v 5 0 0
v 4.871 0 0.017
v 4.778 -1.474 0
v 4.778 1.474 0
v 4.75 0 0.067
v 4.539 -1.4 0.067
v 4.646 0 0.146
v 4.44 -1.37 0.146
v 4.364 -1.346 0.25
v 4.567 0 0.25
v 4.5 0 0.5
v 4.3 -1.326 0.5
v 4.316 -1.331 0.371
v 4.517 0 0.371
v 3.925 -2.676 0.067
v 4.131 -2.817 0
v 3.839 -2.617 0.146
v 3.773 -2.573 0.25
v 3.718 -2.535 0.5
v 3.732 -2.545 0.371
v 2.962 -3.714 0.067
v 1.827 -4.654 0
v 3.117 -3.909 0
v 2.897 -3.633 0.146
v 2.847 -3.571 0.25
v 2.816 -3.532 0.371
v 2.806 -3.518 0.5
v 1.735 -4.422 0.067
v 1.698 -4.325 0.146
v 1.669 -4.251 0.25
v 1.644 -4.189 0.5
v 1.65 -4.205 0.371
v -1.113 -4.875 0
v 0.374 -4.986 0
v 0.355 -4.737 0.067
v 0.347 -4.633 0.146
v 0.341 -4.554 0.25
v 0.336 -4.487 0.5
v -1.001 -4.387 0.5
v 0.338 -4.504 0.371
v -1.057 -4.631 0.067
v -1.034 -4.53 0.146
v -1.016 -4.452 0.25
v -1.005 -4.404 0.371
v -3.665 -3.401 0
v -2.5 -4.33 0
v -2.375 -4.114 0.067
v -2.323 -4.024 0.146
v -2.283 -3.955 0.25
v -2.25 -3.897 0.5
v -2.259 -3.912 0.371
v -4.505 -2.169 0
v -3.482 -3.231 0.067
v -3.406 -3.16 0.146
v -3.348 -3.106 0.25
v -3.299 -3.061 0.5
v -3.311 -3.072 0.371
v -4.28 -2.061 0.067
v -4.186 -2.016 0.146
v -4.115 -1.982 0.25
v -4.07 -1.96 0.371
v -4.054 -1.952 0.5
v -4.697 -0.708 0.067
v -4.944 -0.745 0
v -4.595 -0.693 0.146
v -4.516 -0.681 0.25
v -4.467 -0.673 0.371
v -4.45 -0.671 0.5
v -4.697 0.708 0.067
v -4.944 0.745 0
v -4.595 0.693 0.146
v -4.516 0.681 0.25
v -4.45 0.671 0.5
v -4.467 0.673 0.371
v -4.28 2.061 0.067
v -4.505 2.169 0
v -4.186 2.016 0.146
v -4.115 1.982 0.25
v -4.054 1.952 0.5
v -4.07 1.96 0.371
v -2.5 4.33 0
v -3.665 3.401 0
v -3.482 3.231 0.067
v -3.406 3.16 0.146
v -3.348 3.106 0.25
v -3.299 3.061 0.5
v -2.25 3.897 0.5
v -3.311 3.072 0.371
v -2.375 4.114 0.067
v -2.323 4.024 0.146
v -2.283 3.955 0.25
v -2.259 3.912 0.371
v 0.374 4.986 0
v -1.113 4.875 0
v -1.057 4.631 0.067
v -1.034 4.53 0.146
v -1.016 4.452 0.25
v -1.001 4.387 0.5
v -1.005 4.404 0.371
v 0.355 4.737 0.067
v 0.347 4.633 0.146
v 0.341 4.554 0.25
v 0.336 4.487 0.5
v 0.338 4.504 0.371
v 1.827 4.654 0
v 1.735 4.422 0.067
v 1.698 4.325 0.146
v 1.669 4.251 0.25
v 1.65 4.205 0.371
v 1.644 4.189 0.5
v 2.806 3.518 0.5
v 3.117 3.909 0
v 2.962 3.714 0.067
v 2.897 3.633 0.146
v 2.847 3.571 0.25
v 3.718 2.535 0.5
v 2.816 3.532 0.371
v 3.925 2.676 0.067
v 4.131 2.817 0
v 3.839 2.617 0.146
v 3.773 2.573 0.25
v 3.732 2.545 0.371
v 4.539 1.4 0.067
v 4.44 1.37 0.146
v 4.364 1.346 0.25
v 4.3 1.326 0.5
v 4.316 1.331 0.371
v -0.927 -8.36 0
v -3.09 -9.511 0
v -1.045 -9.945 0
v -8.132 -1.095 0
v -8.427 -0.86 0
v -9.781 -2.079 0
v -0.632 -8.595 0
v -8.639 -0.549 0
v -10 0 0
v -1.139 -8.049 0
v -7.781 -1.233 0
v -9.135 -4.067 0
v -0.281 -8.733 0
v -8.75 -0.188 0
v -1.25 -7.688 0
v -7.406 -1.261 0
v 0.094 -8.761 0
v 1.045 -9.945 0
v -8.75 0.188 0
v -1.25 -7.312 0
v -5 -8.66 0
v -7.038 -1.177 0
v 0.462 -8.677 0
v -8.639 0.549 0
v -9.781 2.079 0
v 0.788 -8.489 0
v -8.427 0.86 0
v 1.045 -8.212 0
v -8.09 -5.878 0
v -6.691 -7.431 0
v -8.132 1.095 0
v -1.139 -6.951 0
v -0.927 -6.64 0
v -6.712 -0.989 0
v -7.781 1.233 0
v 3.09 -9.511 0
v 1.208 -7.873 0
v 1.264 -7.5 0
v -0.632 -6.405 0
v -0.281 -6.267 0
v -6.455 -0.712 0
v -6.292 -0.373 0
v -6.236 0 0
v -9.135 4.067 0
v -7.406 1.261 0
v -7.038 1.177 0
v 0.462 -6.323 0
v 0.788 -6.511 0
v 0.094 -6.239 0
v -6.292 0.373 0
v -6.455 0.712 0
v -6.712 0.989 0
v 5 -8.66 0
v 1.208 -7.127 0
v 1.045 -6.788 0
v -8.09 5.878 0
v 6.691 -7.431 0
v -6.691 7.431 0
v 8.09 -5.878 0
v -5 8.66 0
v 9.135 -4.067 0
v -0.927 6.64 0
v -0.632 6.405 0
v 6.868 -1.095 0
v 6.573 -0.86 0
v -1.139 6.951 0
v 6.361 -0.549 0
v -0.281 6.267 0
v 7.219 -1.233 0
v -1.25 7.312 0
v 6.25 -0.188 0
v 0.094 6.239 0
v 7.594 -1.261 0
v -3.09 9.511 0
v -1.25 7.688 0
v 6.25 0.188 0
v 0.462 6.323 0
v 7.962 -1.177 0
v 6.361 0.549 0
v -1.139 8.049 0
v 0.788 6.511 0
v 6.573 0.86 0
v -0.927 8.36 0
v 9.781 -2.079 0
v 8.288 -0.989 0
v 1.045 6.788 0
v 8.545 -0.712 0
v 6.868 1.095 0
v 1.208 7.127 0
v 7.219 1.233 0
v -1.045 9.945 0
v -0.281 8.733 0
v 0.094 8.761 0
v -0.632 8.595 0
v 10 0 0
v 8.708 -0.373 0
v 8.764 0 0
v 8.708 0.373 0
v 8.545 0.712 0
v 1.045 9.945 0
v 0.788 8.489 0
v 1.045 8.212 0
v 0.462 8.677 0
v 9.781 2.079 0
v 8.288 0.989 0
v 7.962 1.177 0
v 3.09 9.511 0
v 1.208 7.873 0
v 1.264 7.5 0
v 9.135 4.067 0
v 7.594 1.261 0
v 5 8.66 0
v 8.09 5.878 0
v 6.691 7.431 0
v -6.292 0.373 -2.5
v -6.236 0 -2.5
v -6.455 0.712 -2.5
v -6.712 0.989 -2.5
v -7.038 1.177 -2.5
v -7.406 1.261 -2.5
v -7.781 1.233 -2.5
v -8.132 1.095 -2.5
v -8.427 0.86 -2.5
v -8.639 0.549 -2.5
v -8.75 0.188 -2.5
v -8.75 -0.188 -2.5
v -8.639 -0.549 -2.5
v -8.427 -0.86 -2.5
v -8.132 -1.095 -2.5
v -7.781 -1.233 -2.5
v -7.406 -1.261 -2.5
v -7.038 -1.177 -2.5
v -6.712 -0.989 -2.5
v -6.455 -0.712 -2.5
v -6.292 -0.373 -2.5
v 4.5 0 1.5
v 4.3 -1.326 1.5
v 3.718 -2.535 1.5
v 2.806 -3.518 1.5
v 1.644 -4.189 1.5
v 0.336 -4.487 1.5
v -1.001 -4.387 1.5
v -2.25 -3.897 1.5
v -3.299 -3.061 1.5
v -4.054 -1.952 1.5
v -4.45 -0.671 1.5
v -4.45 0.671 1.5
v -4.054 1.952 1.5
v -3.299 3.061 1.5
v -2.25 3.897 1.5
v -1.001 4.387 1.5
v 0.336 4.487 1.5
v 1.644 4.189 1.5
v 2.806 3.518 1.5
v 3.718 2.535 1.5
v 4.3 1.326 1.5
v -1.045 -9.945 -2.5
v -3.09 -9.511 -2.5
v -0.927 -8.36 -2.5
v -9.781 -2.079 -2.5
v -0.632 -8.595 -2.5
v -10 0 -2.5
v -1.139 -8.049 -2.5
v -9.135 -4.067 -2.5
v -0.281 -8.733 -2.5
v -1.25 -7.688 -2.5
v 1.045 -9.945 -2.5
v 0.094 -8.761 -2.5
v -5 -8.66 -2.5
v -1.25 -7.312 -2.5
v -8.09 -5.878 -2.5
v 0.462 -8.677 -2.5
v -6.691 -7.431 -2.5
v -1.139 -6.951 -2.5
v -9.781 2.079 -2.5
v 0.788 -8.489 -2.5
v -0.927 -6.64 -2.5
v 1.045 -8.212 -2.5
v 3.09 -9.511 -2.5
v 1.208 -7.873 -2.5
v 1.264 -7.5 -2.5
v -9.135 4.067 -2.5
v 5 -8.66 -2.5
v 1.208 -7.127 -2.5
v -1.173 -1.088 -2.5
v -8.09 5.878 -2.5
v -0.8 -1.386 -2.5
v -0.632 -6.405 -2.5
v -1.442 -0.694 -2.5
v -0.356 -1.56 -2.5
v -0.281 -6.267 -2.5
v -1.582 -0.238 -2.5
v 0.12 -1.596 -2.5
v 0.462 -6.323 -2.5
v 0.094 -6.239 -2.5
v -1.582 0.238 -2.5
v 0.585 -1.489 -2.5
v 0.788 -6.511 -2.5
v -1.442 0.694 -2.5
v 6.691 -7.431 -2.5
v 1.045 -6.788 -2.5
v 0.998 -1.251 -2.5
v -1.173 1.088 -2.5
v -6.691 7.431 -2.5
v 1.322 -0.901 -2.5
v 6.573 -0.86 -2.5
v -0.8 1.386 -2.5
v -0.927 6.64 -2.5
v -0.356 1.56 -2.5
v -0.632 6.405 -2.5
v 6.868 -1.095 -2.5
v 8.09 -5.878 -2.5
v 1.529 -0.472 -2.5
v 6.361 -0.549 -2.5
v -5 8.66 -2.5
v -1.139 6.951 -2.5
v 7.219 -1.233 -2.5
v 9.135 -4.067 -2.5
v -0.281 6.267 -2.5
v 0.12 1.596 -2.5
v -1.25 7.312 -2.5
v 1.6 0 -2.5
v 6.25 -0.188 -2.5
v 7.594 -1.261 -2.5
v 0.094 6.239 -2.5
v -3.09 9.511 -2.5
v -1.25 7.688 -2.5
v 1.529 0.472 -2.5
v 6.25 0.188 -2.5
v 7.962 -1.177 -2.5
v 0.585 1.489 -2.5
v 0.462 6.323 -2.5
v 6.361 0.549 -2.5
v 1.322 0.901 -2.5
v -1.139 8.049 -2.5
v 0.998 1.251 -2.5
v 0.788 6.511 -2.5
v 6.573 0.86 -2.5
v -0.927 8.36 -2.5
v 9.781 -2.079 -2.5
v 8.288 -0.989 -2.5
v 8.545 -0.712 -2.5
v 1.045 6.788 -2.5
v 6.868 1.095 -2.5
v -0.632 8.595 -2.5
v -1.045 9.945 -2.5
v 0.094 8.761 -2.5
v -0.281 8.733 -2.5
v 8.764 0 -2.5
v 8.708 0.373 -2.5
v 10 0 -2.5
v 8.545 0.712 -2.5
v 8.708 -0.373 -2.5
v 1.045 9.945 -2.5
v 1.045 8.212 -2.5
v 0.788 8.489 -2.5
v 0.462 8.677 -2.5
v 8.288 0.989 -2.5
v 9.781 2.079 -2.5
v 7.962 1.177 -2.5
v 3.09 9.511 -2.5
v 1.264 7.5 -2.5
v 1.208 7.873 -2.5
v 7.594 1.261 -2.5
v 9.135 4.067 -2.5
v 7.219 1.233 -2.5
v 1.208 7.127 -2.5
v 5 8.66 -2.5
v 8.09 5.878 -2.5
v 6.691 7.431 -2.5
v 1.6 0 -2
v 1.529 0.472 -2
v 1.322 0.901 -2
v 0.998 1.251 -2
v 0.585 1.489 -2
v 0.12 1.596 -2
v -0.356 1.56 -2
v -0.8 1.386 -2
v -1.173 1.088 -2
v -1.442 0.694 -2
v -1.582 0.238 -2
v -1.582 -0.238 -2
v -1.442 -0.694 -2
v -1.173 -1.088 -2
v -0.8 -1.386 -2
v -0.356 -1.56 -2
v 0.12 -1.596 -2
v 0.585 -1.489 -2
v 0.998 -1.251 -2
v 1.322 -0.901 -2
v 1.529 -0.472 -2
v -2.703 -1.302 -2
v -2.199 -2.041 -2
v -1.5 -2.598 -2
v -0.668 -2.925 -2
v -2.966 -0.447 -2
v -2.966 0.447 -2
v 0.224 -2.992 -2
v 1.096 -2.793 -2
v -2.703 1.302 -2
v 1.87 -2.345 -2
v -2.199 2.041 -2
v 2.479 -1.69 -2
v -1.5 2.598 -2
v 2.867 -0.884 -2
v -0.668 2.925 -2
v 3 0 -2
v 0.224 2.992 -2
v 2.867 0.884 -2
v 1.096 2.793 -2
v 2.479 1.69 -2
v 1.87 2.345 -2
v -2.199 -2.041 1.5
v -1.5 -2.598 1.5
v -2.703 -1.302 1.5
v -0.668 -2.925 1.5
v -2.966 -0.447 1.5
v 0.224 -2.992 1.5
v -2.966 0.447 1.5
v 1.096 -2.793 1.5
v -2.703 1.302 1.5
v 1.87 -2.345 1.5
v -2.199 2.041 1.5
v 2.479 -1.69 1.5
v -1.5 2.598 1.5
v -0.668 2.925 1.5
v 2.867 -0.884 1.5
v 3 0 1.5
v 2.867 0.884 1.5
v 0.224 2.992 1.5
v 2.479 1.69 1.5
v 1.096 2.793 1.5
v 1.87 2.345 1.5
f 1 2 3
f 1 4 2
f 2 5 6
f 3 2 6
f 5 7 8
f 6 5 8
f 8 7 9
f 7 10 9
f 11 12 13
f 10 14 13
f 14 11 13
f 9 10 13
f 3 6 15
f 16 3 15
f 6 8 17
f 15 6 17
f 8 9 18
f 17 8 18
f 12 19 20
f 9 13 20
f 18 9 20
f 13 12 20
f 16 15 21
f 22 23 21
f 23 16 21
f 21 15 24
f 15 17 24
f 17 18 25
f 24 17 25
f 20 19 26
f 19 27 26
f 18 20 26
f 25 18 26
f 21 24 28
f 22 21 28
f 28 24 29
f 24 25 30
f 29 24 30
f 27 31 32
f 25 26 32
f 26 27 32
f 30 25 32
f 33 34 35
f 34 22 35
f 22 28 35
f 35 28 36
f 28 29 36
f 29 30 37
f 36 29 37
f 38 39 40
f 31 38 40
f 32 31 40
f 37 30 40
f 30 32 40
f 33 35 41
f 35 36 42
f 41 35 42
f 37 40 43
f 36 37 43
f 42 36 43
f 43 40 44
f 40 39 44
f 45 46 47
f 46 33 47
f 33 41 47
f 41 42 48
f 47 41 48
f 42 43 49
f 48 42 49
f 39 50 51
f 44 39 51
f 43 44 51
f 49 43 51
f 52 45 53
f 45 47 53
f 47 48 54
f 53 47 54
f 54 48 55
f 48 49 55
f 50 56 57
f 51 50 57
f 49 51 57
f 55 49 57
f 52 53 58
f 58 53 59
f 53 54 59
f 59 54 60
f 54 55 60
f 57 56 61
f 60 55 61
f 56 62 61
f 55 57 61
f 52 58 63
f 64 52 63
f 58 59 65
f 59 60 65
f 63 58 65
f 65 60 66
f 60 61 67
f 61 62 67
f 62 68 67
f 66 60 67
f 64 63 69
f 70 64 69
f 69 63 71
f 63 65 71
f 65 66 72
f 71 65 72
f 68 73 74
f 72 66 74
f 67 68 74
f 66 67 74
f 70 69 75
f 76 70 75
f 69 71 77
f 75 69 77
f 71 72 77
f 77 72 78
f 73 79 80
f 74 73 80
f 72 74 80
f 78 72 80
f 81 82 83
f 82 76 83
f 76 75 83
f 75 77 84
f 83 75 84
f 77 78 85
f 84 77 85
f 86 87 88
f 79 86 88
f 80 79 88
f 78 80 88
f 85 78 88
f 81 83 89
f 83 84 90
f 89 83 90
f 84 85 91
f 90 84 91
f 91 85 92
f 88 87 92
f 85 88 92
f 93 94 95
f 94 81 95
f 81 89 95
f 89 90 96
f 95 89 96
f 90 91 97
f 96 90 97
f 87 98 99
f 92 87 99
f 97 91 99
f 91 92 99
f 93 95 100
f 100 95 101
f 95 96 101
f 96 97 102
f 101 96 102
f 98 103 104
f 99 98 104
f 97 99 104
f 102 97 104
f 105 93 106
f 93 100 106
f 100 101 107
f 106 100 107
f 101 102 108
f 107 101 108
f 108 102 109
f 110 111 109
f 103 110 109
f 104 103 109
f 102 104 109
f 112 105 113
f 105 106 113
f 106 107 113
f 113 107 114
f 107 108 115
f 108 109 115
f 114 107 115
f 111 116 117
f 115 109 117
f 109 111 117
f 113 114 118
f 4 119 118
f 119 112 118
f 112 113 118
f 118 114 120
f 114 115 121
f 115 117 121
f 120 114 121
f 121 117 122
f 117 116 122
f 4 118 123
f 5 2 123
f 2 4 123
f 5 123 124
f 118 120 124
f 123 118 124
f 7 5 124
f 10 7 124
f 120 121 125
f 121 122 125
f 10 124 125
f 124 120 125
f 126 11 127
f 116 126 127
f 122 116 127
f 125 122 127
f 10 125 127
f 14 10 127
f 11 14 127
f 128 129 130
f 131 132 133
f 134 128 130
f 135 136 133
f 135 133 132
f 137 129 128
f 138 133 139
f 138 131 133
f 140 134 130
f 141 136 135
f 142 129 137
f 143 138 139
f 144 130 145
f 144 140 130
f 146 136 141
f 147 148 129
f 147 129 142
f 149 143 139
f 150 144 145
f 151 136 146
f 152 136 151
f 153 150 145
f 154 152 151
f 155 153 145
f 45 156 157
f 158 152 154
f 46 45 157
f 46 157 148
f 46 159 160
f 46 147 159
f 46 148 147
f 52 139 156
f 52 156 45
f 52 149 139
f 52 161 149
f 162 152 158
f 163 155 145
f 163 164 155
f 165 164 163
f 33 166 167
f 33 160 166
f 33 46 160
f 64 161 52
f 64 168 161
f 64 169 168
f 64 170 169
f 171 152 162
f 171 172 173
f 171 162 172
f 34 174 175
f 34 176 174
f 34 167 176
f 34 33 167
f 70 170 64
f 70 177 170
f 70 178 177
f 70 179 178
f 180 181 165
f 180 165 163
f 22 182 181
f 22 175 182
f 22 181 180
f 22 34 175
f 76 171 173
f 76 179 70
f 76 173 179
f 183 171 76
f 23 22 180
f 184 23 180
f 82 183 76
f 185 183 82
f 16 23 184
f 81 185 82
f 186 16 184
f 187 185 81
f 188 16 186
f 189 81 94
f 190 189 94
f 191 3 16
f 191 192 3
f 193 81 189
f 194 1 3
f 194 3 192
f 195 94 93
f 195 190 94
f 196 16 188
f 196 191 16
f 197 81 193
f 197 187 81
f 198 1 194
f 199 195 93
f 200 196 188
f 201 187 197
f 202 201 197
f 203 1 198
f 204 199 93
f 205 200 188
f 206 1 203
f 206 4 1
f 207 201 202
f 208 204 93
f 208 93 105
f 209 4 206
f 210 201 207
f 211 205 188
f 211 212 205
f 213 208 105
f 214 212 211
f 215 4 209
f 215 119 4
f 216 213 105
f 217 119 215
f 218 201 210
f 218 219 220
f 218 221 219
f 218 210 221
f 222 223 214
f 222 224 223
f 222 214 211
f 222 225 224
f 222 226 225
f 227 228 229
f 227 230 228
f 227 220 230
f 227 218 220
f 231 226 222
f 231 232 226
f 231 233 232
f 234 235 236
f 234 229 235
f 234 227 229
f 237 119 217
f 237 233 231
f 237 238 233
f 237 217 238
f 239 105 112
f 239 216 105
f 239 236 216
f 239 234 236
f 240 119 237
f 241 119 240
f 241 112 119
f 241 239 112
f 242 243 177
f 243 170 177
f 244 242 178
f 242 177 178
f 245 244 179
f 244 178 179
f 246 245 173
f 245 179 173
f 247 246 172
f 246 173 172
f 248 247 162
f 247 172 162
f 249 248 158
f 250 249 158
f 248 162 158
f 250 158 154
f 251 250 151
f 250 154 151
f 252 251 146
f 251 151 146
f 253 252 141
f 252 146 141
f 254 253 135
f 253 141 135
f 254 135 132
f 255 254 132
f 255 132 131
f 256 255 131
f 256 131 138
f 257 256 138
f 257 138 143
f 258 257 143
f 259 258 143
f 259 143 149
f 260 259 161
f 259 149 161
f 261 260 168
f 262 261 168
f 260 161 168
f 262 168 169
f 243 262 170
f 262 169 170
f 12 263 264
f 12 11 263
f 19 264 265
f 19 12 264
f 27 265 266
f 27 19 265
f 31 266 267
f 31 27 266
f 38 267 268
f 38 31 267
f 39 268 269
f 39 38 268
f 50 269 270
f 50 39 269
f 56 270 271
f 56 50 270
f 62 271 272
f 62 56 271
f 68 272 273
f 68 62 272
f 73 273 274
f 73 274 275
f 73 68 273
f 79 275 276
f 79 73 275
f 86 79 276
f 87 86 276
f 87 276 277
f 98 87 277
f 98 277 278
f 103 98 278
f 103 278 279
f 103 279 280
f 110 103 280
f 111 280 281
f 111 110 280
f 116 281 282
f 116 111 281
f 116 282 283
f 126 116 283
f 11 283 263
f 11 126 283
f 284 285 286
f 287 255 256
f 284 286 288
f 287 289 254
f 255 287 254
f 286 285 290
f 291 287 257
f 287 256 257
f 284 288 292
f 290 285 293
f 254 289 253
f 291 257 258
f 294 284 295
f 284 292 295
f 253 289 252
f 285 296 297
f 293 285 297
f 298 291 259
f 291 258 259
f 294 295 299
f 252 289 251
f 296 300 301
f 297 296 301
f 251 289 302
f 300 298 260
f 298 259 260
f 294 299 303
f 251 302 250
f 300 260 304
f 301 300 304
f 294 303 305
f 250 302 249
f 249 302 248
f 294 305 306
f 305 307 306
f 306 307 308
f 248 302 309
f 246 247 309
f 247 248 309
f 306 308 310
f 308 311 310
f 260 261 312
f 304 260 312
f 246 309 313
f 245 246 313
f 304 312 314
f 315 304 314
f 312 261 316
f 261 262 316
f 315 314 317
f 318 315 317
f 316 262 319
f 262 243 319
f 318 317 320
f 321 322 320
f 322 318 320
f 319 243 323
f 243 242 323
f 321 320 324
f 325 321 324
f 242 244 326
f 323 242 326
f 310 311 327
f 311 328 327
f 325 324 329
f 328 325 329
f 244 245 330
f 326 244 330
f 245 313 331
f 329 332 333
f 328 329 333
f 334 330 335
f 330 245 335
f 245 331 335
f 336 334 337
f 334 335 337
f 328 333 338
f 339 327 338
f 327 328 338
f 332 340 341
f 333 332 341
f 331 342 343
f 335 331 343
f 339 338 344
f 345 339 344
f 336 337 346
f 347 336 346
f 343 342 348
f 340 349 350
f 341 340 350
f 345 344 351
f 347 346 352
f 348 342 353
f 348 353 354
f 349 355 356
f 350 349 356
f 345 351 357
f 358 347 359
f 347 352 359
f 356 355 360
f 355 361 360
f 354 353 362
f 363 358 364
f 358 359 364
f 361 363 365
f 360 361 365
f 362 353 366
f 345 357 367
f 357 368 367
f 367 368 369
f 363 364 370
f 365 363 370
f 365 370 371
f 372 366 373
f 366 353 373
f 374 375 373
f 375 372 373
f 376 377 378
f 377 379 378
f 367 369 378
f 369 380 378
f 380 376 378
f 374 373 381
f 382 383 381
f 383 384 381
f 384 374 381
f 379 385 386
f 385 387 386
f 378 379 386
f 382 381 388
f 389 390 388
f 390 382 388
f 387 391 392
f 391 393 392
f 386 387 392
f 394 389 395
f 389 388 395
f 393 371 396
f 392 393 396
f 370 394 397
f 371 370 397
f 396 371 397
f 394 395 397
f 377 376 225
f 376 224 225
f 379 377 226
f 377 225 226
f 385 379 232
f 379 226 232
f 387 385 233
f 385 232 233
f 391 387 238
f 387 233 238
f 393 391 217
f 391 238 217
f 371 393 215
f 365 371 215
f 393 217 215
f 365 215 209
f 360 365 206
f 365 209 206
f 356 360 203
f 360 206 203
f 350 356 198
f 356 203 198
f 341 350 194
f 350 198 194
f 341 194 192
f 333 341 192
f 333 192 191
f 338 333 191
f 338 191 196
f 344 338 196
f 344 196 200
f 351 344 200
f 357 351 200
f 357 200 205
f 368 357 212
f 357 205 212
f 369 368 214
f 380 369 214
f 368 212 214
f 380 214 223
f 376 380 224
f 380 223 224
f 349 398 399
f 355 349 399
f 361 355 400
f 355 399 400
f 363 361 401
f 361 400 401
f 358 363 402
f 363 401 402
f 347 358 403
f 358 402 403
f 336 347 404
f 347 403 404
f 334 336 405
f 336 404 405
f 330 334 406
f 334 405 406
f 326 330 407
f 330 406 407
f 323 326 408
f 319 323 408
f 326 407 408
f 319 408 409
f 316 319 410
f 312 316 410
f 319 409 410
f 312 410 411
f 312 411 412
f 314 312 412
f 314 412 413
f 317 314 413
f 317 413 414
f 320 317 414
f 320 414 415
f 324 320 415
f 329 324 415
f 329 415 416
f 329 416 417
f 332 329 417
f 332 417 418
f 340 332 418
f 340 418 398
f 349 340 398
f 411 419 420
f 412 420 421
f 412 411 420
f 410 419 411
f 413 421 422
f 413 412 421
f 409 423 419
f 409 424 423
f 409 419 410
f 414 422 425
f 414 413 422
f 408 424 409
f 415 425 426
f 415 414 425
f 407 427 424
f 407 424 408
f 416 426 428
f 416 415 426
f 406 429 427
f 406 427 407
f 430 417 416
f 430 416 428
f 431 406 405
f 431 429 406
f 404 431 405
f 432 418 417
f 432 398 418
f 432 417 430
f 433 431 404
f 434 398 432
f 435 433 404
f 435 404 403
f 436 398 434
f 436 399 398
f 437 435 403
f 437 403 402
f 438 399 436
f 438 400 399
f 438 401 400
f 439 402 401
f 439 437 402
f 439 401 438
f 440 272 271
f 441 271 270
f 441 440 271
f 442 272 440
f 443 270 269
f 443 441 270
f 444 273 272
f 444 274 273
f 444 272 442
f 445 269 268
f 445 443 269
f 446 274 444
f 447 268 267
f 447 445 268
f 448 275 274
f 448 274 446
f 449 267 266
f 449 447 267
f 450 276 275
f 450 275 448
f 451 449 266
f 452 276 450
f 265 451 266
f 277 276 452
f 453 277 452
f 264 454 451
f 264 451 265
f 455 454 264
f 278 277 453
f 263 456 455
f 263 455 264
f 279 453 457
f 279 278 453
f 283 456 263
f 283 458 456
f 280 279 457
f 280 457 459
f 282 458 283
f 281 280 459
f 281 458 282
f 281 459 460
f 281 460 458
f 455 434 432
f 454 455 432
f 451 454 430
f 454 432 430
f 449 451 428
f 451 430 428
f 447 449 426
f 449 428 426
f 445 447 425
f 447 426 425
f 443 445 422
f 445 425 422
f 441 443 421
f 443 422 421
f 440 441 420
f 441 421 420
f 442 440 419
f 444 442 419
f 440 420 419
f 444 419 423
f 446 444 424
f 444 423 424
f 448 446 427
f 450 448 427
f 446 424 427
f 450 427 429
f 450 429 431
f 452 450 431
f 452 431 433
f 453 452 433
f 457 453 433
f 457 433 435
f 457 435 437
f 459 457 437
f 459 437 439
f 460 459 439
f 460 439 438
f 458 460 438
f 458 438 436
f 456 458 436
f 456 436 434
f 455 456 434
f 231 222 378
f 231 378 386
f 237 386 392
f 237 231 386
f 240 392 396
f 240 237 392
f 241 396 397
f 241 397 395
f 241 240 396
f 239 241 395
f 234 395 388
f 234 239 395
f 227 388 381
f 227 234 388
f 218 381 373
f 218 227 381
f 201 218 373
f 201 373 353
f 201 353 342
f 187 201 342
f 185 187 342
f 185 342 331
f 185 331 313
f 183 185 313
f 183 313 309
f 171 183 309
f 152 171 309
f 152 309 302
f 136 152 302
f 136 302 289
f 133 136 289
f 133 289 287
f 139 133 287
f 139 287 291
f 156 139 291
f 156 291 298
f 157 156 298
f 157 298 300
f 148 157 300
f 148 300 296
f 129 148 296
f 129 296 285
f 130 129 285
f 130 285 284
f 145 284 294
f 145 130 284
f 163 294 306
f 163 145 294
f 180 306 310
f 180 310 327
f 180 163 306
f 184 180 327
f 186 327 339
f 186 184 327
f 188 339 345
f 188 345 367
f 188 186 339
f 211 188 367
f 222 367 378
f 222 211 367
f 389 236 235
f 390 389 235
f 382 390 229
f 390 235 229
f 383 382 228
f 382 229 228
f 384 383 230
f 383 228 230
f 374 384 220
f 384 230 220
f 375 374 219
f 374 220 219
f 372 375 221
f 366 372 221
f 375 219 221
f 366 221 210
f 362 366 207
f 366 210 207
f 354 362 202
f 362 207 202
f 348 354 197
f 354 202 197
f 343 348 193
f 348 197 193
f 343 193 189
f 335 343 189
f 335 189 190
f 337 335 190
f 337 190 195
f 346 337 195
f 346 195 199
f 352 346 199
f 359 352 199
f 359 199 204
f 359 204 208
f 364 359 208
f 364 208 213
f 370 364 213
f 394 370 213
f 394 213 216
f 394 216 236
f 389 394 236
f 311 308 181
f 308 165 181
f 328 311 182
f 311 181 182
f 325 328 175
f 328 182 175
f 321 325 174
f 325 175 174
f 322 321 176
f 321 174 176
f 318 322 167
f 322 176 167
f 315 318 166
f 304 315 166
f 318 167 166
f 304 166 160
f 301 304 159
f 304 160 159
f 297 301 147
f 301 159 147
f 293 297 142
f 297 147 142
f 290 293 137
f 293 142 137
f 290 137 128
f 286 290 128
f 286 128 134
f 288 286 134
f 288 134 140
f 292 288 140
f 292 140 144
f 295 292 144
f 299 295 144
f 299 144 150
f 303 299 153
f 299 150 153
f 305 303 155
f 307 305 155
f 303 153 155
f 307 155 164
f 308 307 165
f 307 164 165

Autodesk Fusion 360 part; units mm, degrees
sketch "Sketch1" plane through (0, 0, 0) normal (0, 0, 1) x (1, 0, 0)
  circle A0 centre (0, 0) radius 10
  circle A1 centre (0, 0) radius 7.5 construction
  circle A2 centre (0, 7.5) radius 1.5
  circle A3 centre (-7.5, 0) radius 1.5
  circle A4 centre (0, -7.5) radius 1.5
  circle A5 centre (7.5, 0) radius 1.5
  line L0 (0, 7.5) -> (0, 0) construction
  circle A6 centre (0, 0) radius 4.5
  circle A7 centre (0, 0) radius 1.6
  circle A8 centre (0, 0) radius 3
  dimension "d1" = 20
  dimension "d2" = 15
  dimension "d3" = 3
  dimension "d6" = 360
  dimension "d7" = 9
  dimension "d8" = 3.2
  dimension "d9" = 6
extrude "Extrude1" add sketch "Sketch1" against normal blind 2.5 contours A0 | A6 | A8
extrude "Extrude2" add sketch "Sketch1" along normal blind 1.5 contours A6
fillet "Fillet1" radius 0.5 1 edges at (-4.1955, 1.6273, 0)
move_face "OffsetFaces1" offset -2 1 faces at (2.5162, -0.2285, 0)
thread "Thread1" "ISO Metric profile 3.0 M3x0.5 M3x0.5 6H" major diameter 3.086 minor diameter 2.529 pitch 0.5 angle 60 resizes the face on face at (1.4981, -7.5748, -1.6667) on face at (-6.0019, -0.0748, -1.6667) on face at (8.9981, -0.0748, -1.6667) on face at (1.4981, 7.4252, -1.6667)
